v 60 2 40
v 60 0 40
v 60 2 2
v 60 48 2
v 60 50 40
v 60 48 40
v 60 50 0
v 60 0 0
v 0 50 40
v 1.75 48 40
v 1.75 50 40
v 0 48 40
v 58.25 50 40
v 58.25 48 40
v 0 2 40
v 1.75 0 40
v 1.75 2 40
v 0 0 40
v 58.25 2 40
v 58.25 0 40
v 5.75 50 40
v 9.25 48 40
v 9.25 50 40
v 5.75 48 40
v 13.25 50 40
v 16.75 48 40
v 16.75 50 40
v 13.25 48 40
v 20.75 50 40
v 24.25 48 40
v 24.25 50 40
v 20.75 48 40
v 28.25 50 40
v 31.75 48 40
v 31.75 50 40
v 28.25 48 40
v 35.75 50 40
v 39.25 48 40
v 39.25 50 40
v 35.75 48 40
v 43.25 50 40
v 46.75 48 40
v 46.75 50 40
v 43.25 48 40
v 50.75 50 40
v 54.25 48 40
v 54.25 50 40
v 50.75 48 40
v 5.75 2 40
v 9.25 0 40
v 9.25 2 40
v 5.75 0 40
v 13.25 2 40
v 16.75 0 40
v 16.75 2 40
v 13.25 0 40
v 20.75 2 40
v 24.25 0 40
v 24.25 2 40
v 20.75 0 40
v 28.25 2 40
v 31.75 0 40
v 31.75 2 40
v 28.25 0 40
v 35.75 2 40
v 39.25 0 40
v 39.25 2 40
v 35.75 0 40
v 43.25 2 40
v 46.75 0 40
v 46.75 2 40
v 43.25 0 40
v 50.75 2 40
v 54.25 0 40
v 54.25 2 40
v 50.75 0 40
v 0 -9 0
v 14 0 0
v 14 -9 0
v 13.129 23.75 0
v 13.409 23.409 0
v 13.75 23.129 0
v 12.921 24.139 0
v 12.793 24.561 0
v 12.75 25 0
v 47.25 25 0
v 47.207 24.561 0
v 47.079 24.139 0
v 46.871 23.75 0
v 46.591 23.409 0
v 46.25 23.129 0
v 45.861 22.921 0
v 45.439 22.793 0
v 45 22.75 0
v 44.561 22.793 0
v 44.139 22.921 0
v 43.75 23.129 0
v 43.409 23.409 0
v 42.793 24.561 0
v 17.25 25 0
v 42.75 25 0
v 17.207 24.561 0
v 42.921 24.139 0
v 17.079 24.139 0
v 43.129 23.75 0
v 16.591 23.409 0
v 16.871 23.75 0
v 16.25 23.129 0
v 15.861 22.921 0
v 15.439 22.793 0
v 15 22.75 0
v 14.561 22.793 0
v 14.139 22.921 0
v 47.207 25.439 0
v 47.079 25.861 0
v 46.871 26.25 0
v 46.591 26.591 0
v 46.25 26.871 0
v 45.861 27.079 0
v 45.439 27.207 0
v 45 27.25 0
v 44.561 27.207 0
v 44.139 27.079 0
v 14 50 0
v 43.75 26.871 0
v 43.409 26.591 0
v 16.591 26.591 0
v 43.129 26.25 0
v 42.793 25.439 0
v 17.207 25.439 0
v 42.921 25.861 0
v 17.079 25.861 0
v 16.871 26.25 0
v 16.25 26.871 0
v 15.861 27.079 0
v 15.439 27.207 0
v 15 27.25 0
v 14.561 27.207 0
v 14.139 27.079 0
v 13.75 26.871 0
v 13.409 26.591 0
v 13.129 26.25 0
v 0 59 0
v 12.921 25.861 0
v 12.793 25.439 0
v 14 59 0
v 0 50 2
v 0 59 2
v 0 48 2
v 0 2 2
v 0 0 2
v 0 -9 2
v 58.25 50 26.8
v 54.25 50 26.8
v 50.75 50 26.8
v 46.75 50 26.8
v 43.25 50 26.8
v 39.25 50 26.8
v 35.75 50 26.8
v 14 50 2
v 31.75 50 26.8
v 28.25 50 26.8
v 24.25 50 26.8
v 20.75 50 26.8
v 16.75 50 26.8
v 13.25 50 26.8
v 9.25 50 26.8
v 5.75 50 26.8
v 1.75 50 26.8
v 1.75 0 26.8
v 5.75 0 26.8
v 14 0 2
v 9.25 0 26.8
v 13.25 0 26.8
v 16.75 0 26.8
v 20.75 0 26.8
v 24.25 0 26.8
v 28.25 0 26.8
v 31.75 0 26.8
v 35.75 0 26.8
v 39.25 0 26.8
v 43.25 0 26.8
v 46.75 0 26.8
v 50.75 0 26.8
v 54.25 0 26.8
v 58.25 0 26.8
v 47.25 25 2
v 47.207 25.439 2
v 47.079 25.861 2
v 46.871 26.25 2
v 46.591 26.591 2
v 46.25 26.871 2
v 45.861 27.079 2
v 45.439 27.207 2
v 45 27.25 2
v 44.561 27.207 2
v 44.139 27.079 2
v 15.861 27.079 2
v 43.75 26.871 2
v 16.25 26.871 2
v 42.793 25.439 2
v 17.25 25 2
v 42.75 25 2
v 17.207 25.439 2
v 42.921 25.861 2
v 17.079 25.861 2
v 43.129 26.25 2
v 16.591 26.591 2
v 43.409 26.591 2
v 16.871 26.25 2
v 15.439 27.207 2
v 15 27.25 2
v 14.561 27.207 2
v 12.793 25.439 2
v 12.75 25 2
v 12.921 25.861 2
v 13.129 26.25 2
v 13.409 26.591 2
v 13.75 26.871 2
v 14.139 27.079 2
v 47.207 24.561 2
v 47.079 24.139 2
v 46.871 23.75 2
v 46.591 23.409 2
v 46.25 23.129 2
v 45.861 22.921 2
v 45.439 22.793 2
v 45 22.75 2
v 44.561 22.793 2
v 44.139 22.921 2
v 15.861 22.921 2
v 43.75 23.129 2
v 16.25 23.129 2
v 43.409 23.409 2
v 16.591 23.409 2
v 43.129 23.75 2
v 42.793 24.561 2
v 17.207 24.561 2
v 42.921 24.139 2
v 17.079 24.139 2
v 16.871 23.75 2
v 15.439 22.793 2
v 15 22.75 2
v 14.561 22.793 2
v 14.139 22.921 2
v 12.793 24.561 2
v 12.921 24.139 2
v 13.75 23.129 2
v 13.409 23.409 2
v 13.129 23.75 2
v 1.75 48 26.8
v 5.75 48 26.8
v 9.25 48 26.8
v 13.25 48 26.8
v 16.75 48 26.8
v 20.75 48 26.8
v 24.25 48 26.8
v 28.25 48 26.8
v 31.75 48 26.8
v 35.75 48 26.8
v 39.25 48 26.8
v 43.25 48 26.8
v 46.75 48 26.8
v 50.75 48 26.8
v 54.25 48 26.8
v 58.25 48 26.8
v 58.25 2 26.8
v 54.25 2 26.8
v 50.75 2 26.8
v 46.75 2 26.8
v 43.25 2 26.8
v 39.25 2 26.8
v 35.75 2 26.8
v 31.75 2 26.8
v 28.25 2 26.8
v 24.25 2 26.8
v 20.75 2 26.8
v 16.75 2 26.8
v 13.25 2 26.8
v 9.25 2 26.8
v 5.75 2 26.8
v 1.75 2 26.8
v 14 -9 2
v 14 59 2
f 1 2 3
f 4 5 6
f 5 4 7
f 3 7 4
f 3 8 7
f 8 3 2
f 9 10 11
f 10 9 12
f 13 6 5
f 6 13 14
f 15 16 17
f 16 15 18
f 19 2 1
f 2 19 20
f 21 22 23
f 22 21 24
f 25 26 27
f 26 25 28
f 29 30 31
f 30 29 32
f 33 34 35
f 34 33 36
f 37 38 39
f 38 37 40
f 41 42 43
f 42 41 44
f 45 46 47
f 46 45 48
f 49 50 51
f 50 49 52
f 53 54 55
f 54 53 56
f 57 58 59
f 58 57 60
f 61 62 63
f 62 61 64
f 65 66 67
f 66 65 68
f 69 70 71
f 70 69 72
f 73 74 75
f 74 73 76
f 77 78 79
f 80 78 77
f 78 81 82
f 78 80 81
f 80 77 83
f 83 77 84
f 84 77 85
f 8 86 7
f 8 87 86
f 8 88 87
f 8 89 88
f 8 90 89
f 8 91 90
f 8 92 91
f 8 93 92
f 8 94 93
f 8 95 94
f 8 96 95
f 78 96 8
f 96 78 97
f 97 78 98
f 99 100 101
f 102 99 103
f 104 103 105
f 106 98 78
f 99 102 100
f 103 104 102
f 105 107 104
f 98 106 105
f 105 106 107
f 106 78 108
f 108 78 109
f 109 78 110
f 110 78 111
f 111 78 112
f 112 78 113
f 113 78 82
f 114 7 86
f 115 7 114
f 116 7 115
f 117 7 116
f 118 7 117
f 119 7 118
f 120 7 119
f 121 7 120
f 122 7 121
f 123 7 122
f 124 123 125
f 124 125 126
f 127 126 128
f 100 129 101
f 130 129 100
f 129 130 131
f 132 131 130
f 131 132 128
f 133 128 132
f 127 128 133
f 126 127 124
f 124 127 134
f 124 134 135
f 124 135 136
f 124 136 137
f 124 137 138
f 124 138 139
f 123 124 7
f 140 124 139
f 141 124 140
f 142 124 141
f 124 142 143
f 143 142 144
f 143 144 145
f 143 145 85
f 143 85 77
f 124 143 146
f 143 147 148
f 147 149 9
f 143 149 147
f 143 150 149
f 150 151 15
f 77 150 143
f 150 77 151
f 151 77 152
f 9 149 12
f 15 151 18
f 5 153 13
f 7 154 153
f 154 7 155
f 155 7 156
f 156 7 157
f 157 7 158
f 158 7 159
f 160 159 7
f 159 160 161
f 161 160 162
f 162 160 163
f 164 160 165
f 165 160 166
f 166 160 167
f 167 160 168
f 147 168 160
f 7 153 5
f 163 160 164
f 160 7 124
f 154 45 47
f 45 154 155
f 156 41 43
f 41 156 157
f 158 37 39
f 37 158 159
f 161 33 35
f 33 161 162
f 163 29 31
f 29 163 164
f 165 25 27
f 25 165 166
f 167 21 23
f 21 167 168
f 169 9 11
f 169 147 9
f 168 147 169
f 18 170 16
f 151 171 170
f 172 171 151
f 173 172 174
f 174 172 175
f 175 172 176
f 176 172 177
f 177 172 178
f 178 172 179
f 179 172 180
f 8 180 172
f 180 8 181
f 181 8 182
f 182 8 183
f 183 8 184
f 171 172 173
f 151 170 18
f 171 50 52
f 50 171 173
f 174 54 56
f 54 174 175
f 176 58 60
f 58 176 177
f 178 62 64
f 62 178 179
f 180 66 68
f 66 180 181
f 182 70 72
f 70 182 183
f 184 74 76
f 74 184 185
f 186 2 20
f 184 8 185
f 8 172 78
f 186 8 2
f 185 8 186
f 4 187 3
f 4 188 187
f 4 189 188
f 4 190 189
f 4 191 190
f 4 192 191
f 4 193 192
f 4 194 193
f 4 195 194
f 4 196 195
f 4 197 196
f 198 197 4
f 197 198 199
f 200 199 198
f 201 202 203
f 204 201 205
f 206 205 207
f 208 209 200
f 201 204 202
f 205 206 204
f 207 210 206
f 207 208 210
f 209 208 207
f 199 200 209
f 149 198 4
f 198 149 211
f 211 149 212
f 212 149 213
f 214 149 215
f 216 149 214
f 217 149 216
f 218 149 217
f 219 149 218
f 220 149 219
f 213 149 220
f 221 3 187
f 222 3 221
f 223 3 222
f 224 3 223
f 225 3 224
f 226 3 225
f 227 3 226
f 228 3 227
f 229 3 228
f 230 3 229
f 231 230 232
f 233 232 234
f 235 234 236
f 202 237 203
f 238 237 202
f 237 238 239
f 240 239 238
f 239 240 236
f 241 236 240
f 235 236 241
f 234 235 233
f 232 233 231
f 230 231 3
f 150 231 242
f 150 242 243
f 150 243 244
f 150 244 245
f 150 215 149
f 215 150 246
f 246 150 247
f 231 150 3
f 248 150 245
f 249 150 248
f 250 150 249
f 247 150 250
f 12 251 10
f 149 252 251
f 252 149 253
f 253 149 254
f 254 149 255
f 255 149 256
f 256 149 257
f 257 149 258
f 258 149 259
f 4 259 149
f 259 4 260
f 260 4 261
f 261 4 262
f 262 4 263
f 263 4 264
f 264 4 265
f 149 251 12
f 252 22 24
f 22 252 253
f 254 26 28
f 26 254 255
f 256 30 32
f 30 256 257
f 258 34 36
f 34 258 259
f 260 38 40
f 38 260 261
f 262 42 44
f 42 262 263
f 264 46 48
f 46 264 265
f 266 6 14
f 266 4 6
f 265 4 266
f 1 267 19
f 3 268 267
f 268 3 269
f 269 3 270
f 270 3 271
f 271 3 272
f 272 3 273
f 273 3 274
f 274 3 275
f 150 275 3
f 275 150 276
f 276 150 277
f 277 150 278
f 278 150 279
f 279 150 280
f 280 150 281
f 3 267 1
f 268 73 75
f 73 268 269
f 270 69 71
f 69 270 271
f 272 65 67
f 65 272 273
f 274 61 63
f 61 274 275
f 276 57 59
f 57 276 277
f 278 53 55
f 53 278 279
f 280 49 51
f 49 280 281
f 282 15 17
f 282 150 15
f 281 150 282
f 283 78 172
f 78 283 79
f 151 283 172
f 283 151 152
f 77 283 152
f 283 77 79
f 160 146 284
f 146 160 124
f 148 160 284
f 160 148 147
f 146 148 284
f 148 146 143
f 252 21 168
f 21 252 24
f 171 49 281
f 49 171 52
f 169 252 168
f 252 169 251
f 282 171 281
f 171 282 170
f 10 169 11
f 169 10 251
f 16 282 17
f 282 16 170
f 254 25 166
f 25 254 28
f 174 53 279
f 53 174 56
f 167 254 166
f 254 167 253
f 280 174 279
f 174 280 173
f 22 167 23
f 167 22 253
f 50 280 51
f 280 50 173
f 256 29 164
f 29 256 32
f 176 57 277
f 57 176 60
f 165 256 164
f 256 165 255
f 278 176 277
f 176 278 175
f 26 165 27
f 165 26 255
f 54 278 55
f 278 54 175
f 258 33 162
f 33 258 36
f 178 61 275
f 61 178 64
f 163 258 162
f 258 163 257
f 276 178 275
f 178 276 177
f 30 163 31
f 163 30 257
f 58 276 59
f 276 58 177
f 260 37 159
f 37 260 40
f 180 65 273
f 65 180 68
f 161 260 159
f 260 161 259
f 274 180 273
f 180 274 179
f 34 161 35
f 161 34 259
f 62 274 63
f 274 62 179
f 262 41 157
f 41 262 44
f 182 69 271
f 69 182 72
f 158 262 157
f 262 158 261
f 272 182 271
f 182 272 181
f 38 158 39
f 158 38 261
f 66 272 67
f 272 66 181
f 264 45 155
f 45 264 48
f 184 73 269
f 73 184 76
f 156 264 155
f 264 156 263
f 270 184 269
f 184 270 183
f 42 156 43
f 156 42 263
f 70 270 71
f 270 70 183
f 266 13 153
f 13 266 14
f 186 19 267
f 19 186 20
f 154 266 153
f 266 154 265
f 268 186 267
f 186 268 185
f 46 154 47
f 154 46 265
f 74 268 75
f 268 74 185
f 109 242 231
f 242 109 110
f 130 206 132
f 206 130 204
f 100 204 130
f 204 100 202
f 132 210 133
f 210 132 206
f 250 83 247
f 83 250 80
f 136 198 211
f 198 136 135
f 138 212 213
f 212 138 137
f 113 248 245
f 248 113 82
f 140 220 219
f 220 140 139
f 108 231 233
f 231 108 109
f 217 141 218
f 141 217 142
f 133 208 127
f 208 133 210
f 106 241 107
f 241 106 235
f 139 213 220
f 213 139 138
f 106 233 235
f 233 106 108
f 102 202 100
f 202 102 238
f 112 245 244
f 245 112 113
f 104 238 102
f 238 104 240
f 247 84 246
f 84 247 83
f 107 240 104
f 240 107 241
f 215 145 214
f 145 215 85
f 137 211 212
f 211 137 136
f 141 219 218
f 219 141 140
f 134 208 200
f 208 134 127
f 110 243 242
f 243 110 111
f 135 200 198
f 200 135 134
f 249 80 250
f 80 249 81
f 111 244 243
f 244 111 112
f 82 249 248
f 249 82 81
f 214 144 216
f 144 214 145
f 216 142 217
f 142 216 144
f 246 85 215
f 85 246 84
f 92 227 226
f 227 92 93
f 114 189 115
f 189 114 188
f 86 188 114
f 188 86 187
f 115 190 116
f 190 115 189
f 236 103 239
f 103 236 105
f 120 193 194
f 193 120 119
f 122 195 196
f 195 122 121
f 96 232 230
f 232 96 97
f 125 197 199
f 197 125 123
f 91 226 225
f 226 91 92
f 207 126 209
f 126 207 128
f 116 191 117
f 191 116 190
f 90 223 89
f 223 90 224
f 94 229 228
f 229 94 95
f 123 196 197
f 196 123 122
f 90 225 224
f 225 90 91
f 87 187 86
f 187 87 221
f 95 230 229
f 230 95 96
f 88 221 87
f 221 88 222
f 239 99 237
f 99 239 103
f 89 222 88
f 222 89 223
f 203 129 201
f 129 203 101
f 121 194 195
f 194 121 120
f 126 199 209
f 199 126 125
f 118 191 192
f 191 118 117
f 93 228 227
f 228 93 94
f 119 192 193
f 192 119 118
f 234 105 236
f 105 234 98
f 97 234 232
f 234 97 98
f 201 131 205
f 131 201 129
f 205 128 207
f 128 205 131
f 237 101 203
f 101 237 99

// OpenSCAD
$fn = 32;

// ----------------------------------------------------------------------
// Cable duct: 60 x 50 x 40 mm, 8 fingers
// ----------------------------------------------------------------------

// --- parameters (mm) ---
channel_l = 60;           // duct length, X
channel_w = 50;           // duct width, Y
channel_h = 40;           // duct height, Z
channel_t = 2;            // side wall thickness
floor_t = 2;              // floor thickness
slot_w = 4;               // finger slot width
slot_h = 24.8;            // finger slot height
fingers = 8;              // number of finger slots per side
pitch = 7.5;              // finger pitch
hole_d = 4.5;             // floor mounting hole
hole_n = 2;               // mounting holes in the floor
ear_w = 10;               // mounting ear width
ear_l = 14;               // mounting ear length

module shell() {
  difference() {
    cube([channel_l, channel_w, channel_h]);
    /* open top channel */
    translate([-channel_t - 1, channel_t, floor_t])
      cube([channel_l + 2 * channel_t + 2, channel_w - 2 * channel_t, channel_h + 1]);
  }
}

module ears() {
  translate([0, -ear_w + 1, 0]) cube([ear_l, ear_w, floor_t]);
  translate([0, channel_w - 1, 0]) cube([ear_l, ear_w, floor_t]);
}

difference() {
  union() {
    shell();
    ears();
  }
  /* finger slots cut through both side walls */
  for (i = [0 : fingers - 1]) translate([pitch / 2 + i * pitch - slot_w / 2, -1, floor_t + slot_h]) cube([slot_w, channel_w + 2, channel_h]);
  for (i = [0 : hole_n - 1]) translate([(channel_l / hole_n) * (i + 0.5), channel_w / 2, -1]) cylinder(h = floor_t + 2, d = hole_d);
}
